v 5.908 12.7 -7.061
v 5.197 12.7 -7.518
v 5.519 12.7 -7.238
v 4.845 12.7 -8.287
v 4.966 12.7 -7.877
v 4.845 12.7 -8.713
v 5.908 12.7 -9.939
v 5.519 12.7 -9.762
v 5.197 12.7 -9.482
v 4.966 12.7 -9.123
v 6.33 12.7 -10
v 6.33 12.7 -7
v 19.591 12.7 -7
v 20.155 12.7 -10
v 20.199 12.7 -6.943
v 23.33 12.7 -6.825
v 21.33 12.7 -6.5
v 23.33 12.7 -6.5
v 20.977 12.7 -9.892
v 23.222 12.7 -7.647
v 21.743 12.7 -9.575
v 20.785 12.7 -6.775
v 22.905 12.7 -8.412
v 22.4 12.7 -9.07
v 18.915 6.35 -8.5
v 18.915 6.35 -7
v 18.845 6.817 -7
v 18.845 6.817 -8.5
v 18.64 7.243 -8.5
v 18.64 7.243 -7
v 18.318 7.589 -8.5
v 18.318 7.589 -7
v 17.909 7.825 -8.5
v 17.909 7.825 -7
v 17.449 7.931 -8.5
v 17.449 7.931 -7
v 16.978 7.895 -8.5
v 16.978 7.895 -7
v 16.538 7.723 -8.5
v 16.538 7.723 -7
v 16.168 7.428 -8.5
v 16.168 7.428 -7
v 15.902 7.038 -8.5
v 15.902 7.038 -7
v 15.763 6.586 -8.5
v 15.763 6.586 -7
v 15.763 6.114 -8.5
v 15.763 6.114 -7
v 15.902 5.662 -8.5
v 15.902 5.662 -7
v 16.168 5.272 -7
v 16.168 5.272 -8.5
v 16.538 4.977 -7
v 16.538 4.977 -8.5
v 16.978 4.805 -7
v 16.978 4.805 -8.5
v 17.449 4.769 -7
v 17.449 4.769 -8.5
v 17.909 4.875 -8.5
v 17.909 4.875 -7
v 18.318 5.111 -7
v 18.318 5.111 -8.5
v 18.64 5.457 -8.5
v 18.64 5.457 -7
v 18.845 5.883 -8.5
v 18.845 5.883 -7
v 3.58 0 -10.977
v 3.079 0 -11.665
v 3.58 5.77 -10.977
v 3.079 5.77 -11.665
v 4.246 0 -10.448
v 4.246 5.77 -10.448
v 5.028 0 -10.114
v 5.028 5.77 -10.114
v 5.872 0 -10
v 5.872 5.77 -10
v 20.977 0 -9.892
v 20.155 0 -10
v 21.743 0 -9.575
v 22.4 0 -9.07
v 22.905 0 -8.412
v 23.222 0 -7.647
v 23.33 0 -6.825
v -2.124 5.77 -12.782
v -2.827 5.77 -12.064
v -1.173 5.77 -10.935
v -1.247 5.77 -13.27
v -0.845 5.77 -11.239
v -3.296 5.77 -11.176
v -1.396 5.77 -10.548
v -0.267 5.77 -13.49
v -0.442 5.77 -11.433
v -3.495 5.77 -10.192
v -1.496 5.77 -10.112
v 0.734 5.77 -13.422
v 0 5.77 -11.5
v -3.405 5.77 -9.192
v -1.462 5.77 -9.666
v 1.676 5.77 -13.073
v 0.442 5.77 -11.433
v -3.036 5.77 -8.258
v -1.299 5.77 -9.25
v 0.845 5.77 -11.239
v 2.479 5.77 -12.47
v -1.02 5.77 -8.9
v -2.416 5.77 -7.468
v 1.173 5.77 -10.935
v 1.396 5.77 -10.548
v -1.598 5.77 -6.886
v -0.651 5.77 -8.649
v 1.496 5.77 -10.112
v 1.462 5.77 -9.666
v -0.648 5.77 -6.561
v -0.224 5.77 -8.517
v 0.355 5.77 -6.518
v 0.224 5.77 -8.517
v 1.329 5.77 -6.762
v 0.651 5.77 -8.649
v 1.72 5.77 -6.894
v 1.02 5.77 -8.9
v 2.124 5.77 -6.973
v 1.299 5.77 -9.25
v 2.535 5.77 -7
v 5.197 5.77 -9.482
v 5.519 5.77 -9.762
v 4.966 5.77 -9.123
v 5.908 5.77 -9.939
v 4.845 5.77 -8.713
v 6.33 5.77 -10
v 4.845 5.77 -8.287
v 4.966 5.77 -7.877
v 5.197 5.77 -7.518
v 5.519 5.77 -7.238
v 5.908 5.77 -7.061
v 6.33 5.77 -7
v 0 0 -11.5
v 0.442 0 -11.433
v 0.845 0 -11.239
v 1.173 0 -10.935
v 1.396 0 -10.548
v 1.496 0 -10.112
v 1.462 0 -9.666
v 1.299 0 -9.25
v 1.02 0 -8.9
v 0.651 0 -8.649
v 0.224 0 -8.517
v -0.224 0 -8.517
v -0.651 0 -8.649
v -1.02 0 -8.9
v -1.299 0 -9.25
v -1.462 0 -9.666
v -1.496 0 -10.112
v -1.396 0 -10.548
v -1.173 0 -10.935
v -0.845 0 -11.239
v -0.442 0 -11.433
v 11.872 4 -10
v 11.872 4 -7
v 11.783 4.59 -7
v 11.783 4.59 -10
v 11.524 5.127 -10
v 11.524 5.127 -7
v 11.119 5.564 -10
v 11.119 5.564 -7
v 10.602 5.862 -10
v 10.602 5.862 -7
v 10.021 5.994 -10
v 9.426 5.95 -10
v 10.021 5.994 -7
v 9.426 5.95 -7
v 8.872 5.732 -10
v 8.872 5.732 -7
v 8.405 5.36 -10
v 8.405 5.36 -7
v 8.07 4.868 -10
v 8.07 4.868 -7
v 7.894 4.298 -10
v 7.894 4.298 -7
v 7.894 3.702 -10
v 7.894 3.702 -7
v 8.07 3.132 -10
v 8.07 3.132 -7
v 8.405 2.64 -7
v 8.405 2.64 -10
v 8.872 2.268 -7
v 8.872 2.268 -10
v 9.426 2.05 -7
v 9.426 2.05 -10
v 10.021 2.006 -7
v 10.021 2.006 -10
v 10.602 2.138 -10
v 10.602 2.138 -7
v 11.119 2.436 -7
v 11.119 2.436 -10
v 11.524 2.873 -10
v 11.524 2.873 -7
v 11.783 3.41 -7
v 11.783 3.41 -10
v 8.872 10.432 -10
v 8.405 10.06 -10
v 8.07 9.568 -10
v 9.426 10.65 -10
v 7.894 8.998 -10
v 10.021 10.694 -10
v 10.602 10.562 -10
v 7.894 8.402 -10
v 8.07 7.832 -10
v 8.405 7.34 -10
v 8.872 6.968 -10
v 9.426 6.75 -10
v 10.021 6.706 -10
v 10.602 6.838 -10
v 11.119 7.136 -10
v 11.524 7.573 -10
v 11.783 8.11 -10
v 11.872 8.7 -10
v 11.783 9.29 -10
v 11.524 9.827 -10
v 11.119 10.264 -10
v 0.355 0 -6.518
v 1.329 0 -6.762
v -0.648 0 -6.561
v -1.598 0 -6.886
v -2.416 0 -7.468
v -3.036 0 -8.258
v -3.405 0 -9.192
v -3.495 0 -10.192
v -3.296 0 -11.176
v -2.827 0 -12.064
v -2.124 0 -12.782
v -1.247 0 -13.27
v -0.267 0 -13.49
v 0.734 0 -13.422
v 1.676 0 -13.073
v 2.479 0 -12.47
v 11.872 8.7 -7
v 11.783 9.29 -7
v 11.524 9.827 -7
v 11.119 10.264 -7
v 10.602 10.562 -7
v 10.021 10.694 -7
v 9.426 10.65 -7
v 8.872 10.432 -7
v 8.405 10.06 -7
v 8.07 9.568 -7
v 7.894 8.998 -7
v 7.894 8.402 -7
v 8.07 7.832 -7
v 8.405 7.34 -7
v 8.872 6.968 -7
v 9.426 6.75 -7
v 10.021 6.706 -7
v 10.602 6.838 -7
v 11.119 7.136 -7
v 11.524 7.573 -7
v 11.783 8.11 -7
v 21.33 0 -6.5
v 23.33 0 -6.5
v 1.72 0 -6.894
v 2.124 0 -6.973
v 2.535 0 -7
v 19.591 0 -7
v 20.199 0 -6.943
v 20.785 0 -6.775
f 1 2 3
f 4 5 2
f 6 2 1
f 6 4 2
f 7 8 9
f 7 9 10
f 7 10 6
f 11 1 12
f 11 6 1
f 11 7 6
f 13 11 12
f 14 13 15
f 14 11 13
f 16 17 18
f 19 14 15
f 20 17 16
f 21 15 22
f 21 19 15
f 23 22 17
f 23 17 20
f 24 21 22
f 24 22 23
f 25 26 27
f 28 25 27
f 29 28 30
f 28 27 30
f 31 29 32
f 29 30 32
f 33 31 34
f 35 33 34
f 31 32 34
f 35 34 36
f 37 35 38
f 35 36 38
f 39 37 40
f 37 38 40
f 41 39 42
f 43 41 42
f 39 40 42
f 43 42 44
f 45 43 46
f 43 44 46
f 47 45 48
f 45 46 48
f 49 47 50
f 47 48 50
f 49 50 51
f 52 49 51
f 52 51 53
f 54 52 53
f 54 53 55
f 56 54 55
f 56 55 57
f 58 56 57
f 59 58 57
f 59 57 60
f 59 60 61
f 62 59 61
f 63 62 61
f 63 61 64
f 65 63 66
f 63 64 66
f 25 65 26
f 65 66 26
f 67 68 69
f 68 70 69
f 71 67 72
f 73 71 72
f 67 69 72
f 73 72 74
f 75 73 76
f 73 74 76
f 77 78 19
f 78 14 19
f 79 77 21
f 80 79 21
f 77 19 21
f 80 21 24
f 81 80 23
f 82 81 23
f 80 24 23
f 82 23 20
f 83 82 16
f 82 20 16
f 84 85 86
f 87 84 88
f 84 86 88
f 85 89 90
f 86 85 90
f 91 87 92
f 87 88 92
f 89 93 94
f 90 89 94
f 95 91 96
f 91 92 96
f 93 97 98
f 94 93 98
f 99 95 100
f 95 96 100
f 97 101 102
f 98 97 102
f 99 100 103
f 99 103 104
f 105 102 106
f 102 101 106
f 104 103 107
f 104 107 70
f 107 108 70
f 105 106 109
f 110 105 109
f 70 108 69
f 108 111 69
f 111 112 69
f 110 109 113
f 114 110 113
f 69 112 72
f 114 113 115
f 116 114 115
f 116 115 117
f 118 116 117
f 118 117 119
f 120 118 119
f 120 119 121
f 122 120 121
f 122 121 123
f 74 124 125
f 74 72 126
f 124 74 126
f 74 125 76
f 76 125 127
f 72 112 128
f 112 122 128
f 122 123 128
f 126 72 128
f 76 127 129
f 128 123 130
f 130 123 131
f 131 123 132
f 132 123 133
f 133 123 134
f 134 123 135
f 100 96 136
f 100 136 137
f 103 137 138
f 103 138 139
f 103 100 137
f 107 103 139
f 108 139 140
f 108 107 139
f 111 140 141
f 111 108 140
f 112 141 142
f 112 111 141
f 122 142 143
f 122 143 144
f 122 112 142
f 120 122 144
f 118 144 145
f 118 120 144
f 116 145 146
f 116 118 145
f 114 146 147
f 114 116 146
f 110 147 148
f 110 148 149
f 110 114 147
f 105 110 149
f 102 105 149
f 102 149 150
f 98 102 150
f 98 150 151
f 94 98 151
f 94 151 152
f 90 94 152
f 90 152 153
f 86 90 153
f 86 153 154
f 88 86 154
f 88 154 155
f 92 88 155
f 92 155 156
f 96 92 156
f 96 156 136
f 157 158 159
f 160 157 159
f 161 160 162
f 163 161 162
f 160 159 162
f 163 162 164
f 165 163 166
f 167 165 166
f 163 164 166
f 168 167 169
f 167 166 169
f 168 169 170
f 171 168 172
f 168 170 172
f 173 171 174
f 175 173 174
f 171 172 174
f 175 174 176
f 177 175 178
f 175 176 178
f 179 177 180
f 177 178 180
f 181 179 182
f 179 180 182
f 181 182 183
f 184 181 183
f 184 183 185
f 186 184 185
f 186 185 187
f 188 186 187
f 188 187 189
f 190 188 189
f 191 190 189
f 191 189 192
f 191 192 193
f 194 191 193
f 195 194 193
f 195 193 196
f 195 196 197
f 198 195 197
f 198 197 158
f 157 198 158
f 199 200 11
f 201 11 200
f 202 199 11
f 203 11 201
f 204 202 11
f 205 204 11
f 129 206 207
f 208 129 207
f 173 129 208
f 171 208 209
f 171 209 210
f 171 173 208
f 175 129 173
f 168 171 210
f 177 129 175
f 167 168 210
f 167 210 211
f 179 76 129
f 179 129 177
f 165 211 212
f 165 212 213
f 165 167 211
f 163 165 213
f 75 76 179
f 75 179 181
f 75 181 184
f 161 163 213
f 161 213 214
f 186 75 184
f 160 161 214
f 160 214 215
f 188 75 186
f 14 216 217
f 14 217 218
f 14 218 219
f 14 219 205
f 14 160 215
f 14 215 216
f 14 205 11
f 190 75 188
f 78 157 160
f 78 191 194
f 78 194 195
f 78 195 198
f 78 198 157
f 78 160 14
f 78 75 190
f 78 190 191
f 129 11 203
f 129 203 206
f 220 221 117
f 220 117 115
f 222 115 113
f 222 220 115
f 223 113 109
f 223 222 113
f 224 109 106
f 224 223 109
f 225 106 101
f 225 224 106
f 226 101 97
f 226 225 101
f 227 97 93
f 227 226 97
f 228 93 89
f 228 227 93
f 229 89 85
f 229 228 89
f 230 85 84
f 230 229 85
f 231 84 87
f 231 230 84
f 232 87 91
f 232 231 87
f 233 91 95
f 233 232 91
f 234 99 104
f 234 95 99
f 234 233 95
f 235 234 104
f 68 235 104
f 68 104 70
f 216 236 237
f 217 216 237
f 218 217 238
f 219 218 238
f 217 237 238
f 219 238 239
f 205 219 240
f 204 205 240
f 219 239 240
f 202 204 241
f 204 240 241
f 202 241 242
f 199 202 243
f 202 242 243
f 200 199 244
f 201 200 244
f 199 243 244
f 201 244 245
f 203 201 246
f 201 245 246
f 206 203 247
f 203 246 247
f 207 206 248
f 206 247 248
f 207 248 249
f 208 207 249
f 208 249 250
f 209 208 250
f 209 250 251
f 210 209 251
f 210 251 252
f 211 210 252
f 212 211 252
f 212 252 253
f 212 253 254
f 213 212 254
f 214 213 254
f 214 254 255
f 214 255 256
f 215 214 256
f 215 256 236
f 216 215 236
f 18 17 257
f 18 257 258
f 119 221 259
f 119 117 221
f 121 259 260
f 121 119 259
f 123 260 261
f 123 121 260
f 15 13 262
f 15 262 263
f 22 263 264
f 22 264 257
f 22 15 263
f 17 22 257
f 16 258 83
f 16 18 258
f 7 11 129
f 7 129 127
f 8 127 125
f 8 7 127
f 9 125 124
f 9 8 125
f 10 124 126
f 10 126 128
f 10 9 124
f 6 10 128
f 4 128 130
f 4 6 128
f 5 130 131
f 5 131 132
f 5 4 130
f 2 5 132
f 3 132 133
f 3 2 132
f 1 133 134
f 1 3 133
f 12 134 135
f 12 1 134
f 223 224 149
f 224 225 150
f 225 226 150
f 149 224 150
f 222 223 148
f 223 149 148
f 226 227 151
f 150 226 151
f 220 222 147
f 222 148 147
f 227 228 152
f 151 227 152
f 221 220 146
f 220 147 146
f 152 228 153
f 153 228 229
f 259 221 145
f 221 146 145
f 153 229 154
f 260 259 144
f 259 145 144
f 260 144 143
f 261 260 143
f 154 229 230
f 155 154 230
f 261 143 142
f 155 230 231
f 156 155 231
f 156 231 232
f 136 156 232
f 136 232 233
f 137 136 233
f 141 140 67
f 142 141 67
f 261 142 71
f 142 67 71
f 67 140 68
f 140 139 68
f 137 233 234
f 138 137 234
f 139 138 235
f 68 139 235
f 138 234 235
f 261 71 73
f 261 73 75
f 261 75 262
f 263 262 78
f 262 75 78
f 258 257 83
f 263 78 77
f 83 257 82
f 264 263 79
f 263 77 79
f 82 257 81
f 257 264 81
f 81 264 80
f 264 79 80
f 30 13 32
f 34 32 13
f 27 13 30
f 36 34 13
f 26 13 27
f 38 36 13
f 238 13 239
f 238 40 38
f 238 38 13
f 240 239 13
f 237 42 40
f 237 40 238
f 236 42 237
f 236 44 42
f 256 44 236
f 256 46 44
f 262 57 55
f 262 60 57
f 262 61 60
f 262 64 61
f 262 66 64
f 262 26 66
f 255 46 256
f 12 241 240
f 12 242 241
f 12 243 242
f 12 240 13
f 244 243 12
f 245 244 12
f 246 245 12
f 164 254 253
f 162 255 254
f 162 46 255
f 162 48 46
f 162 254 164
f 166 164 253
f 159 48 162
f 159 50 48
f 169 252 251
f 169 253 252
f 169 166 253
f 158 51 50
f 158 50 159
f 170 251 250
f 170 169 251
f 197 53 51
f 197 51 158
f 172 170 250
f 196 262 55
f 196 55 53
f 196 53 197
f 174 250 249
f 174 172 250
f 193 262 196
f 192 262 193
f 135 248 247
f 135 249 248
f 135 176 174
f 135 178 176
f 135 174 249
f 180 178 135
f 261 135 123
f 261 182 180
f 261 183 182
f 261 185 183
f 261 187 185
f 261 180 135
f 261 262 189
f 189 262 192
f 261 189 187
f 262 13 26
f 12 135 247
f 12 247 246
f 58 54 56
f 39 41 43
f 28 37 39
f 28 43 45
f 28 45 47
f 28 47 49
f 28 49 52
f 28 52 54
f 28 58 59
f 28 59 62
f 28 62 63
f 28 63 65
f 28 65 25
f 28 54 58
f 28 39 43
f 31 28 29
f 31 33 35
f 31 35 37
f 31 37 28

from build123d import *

# Parameters (mm, degrees)
SKETCH1_R           = 3.5
BOSS_EXTRUDE1_DEPTH = 12.7
CUT_EXTRUDE1_DEPTH  = 6.93
SKETCH3_R           = 1.5
CUT_EXTRUDE2_DEPTH  = 6.77
SKETCH4_R           = 2
CUT_EXTRUDE3_DEPTH  = 10
SKETCH5_W           = 2
SKETCH5_H           = 0.5
BOSS_EXTRUDE2_DEPTH = 12.7
FILLET1_R           = 3.175
SKETCH6_R           = 1.585
CUT_EXTRUDE4_DEPTH  = 1.5


with BuildPart() as part:
    # Sketch1 → Boss-Extrude1 (new body)
    with BuildSketch(Plane(origin=(0, 0, 0), x_dir=(1, 0, 0), z_dir=(0, 1, 0))):
        Circle(SKETCH1_R)
        with BuildLine():
            ThreePointArc((1.802775638, 3), (3.046285831, 1.723410176), (3.5, 0))
            Line((3.5, 0), (23.330212793, 0))
            Line((23.330212793, 0), (23.330212793, 3))
            Line((23.330212793, 3), (1.802775638, 3))
        make_face()
    extrude(amount=BOSS_EXTRUDE1_DEPTH)

    # Sketch2 → Cut-Extrude1 (cut)
    with BuildSketch(Plane(origin=(0, 12.7, 0), x_dir=(1, 0, 0), z_dir=(0, 1, 0))):
        with BuildLine():
            ThreePointArc((6.330212793, 3), (-6.149926342, 1.5), (6.330212793, 0))
            Line((6.330212793, 0), (3.5, 0))
            ThreePointArc((3.5, 0), (-3.046285831, -1.723410176), (1.802775638, 3))
            Line((1.802775638, 3), (6.330212793, 3))
        make_face()
        with BuildLine():
            Line((3.5, 0), (6.330212793, 0))
            ThreePointArc((6.330212793, 0), (4.830212793, 1.5), (6.330212793, 3))
            Line((6.330212793, 3), (1.802775638, 3))
            ThreePointArc((1.802775638, 3), (-3.046285831, -1.723410176), (3.5, 0))
        make_face()
    extrude(amount=-CUT_EXTRUDE1_DEPTH, mode=Mode.SUBTRACT)

    # Sketch3 → Cut-Extrude2 (cut, through all)
    with BuildSketch(Plane(origin=(0, 5.77, 0), x_dir=(1, 0, 0), z_dir=(0, 1, 0))):
        with Locations(Location((0, 0, 0), (0, 0, 270))):  # turned: the seam where the file's is
            Circle(SKETCH3_R)
    extrude(amount=-CUT_EXTRUDE2_DEPTH, mode=Mode.SUBTRACT)


with BuildPart() as body_2:
    # Mirror1: mirrored copy
    add(part.part.mirror(Plane.XY.offset(-5)))

    # Sketch4 → Cut-Extrude3 (cut)
    with BuildSketch(Plane.XY.offset(-7)):
        with Locations((9.871541535, 8.7)):
            Circle(SKETCH4_R)
        with Locations((9.871541535, 4)):
            Circle(SKETCH4_R)
    extrude(amount=-CUT_EXTRUDE3_DEPTH, mode=Mode.SUBTRACT)

    # Sketch5 → Boss-Extrude2 (add)
    with BuildSketch(Plane(origin=(0, 12.7, 0), x_dir=(1, 0, 0), z_dir=(0, 1, 0))):
        with BuildLine():
            Line((21.330212793, 6.5), (21.330212793, 7))
            Line((21.330212793, 7), (19.59096008, 7))
            ThreePointArc((19.59096008, 7), (20.495808134, 6.872518864), (21.330212793, 6.5))
        make_face()
        with Locations((22.330212793, 6.75)):
            Rectangle(SKETCH5_W, SKETCH5_H)
    extrude(amount=-BOSS_EXTRUDE2_DEPTH)

    # Fillet1
    fillet1_edges = [body_2.edges().sort_by_distance(p)[0] for p in [
        (1.802775638, 2.885, -7),
        (3.5, 2.885, -10),
        (23.330212793, 6.35, -10),
    ]]
    fillet(fillet1_edges, radius=FILLET1_R)

    # Sketch6 → Cut-Extrude4 (cut)
    with BuildSketch(Plane.XY.offset(-7)):
        with Locations((17.330212793, 6.35)):
            Circle(SKETCH6_R)
    extrude(amount=-CUT_EXTRUDE4_DEPTH, mode=Mode.SUBTRACT)


solid = body_2.part
